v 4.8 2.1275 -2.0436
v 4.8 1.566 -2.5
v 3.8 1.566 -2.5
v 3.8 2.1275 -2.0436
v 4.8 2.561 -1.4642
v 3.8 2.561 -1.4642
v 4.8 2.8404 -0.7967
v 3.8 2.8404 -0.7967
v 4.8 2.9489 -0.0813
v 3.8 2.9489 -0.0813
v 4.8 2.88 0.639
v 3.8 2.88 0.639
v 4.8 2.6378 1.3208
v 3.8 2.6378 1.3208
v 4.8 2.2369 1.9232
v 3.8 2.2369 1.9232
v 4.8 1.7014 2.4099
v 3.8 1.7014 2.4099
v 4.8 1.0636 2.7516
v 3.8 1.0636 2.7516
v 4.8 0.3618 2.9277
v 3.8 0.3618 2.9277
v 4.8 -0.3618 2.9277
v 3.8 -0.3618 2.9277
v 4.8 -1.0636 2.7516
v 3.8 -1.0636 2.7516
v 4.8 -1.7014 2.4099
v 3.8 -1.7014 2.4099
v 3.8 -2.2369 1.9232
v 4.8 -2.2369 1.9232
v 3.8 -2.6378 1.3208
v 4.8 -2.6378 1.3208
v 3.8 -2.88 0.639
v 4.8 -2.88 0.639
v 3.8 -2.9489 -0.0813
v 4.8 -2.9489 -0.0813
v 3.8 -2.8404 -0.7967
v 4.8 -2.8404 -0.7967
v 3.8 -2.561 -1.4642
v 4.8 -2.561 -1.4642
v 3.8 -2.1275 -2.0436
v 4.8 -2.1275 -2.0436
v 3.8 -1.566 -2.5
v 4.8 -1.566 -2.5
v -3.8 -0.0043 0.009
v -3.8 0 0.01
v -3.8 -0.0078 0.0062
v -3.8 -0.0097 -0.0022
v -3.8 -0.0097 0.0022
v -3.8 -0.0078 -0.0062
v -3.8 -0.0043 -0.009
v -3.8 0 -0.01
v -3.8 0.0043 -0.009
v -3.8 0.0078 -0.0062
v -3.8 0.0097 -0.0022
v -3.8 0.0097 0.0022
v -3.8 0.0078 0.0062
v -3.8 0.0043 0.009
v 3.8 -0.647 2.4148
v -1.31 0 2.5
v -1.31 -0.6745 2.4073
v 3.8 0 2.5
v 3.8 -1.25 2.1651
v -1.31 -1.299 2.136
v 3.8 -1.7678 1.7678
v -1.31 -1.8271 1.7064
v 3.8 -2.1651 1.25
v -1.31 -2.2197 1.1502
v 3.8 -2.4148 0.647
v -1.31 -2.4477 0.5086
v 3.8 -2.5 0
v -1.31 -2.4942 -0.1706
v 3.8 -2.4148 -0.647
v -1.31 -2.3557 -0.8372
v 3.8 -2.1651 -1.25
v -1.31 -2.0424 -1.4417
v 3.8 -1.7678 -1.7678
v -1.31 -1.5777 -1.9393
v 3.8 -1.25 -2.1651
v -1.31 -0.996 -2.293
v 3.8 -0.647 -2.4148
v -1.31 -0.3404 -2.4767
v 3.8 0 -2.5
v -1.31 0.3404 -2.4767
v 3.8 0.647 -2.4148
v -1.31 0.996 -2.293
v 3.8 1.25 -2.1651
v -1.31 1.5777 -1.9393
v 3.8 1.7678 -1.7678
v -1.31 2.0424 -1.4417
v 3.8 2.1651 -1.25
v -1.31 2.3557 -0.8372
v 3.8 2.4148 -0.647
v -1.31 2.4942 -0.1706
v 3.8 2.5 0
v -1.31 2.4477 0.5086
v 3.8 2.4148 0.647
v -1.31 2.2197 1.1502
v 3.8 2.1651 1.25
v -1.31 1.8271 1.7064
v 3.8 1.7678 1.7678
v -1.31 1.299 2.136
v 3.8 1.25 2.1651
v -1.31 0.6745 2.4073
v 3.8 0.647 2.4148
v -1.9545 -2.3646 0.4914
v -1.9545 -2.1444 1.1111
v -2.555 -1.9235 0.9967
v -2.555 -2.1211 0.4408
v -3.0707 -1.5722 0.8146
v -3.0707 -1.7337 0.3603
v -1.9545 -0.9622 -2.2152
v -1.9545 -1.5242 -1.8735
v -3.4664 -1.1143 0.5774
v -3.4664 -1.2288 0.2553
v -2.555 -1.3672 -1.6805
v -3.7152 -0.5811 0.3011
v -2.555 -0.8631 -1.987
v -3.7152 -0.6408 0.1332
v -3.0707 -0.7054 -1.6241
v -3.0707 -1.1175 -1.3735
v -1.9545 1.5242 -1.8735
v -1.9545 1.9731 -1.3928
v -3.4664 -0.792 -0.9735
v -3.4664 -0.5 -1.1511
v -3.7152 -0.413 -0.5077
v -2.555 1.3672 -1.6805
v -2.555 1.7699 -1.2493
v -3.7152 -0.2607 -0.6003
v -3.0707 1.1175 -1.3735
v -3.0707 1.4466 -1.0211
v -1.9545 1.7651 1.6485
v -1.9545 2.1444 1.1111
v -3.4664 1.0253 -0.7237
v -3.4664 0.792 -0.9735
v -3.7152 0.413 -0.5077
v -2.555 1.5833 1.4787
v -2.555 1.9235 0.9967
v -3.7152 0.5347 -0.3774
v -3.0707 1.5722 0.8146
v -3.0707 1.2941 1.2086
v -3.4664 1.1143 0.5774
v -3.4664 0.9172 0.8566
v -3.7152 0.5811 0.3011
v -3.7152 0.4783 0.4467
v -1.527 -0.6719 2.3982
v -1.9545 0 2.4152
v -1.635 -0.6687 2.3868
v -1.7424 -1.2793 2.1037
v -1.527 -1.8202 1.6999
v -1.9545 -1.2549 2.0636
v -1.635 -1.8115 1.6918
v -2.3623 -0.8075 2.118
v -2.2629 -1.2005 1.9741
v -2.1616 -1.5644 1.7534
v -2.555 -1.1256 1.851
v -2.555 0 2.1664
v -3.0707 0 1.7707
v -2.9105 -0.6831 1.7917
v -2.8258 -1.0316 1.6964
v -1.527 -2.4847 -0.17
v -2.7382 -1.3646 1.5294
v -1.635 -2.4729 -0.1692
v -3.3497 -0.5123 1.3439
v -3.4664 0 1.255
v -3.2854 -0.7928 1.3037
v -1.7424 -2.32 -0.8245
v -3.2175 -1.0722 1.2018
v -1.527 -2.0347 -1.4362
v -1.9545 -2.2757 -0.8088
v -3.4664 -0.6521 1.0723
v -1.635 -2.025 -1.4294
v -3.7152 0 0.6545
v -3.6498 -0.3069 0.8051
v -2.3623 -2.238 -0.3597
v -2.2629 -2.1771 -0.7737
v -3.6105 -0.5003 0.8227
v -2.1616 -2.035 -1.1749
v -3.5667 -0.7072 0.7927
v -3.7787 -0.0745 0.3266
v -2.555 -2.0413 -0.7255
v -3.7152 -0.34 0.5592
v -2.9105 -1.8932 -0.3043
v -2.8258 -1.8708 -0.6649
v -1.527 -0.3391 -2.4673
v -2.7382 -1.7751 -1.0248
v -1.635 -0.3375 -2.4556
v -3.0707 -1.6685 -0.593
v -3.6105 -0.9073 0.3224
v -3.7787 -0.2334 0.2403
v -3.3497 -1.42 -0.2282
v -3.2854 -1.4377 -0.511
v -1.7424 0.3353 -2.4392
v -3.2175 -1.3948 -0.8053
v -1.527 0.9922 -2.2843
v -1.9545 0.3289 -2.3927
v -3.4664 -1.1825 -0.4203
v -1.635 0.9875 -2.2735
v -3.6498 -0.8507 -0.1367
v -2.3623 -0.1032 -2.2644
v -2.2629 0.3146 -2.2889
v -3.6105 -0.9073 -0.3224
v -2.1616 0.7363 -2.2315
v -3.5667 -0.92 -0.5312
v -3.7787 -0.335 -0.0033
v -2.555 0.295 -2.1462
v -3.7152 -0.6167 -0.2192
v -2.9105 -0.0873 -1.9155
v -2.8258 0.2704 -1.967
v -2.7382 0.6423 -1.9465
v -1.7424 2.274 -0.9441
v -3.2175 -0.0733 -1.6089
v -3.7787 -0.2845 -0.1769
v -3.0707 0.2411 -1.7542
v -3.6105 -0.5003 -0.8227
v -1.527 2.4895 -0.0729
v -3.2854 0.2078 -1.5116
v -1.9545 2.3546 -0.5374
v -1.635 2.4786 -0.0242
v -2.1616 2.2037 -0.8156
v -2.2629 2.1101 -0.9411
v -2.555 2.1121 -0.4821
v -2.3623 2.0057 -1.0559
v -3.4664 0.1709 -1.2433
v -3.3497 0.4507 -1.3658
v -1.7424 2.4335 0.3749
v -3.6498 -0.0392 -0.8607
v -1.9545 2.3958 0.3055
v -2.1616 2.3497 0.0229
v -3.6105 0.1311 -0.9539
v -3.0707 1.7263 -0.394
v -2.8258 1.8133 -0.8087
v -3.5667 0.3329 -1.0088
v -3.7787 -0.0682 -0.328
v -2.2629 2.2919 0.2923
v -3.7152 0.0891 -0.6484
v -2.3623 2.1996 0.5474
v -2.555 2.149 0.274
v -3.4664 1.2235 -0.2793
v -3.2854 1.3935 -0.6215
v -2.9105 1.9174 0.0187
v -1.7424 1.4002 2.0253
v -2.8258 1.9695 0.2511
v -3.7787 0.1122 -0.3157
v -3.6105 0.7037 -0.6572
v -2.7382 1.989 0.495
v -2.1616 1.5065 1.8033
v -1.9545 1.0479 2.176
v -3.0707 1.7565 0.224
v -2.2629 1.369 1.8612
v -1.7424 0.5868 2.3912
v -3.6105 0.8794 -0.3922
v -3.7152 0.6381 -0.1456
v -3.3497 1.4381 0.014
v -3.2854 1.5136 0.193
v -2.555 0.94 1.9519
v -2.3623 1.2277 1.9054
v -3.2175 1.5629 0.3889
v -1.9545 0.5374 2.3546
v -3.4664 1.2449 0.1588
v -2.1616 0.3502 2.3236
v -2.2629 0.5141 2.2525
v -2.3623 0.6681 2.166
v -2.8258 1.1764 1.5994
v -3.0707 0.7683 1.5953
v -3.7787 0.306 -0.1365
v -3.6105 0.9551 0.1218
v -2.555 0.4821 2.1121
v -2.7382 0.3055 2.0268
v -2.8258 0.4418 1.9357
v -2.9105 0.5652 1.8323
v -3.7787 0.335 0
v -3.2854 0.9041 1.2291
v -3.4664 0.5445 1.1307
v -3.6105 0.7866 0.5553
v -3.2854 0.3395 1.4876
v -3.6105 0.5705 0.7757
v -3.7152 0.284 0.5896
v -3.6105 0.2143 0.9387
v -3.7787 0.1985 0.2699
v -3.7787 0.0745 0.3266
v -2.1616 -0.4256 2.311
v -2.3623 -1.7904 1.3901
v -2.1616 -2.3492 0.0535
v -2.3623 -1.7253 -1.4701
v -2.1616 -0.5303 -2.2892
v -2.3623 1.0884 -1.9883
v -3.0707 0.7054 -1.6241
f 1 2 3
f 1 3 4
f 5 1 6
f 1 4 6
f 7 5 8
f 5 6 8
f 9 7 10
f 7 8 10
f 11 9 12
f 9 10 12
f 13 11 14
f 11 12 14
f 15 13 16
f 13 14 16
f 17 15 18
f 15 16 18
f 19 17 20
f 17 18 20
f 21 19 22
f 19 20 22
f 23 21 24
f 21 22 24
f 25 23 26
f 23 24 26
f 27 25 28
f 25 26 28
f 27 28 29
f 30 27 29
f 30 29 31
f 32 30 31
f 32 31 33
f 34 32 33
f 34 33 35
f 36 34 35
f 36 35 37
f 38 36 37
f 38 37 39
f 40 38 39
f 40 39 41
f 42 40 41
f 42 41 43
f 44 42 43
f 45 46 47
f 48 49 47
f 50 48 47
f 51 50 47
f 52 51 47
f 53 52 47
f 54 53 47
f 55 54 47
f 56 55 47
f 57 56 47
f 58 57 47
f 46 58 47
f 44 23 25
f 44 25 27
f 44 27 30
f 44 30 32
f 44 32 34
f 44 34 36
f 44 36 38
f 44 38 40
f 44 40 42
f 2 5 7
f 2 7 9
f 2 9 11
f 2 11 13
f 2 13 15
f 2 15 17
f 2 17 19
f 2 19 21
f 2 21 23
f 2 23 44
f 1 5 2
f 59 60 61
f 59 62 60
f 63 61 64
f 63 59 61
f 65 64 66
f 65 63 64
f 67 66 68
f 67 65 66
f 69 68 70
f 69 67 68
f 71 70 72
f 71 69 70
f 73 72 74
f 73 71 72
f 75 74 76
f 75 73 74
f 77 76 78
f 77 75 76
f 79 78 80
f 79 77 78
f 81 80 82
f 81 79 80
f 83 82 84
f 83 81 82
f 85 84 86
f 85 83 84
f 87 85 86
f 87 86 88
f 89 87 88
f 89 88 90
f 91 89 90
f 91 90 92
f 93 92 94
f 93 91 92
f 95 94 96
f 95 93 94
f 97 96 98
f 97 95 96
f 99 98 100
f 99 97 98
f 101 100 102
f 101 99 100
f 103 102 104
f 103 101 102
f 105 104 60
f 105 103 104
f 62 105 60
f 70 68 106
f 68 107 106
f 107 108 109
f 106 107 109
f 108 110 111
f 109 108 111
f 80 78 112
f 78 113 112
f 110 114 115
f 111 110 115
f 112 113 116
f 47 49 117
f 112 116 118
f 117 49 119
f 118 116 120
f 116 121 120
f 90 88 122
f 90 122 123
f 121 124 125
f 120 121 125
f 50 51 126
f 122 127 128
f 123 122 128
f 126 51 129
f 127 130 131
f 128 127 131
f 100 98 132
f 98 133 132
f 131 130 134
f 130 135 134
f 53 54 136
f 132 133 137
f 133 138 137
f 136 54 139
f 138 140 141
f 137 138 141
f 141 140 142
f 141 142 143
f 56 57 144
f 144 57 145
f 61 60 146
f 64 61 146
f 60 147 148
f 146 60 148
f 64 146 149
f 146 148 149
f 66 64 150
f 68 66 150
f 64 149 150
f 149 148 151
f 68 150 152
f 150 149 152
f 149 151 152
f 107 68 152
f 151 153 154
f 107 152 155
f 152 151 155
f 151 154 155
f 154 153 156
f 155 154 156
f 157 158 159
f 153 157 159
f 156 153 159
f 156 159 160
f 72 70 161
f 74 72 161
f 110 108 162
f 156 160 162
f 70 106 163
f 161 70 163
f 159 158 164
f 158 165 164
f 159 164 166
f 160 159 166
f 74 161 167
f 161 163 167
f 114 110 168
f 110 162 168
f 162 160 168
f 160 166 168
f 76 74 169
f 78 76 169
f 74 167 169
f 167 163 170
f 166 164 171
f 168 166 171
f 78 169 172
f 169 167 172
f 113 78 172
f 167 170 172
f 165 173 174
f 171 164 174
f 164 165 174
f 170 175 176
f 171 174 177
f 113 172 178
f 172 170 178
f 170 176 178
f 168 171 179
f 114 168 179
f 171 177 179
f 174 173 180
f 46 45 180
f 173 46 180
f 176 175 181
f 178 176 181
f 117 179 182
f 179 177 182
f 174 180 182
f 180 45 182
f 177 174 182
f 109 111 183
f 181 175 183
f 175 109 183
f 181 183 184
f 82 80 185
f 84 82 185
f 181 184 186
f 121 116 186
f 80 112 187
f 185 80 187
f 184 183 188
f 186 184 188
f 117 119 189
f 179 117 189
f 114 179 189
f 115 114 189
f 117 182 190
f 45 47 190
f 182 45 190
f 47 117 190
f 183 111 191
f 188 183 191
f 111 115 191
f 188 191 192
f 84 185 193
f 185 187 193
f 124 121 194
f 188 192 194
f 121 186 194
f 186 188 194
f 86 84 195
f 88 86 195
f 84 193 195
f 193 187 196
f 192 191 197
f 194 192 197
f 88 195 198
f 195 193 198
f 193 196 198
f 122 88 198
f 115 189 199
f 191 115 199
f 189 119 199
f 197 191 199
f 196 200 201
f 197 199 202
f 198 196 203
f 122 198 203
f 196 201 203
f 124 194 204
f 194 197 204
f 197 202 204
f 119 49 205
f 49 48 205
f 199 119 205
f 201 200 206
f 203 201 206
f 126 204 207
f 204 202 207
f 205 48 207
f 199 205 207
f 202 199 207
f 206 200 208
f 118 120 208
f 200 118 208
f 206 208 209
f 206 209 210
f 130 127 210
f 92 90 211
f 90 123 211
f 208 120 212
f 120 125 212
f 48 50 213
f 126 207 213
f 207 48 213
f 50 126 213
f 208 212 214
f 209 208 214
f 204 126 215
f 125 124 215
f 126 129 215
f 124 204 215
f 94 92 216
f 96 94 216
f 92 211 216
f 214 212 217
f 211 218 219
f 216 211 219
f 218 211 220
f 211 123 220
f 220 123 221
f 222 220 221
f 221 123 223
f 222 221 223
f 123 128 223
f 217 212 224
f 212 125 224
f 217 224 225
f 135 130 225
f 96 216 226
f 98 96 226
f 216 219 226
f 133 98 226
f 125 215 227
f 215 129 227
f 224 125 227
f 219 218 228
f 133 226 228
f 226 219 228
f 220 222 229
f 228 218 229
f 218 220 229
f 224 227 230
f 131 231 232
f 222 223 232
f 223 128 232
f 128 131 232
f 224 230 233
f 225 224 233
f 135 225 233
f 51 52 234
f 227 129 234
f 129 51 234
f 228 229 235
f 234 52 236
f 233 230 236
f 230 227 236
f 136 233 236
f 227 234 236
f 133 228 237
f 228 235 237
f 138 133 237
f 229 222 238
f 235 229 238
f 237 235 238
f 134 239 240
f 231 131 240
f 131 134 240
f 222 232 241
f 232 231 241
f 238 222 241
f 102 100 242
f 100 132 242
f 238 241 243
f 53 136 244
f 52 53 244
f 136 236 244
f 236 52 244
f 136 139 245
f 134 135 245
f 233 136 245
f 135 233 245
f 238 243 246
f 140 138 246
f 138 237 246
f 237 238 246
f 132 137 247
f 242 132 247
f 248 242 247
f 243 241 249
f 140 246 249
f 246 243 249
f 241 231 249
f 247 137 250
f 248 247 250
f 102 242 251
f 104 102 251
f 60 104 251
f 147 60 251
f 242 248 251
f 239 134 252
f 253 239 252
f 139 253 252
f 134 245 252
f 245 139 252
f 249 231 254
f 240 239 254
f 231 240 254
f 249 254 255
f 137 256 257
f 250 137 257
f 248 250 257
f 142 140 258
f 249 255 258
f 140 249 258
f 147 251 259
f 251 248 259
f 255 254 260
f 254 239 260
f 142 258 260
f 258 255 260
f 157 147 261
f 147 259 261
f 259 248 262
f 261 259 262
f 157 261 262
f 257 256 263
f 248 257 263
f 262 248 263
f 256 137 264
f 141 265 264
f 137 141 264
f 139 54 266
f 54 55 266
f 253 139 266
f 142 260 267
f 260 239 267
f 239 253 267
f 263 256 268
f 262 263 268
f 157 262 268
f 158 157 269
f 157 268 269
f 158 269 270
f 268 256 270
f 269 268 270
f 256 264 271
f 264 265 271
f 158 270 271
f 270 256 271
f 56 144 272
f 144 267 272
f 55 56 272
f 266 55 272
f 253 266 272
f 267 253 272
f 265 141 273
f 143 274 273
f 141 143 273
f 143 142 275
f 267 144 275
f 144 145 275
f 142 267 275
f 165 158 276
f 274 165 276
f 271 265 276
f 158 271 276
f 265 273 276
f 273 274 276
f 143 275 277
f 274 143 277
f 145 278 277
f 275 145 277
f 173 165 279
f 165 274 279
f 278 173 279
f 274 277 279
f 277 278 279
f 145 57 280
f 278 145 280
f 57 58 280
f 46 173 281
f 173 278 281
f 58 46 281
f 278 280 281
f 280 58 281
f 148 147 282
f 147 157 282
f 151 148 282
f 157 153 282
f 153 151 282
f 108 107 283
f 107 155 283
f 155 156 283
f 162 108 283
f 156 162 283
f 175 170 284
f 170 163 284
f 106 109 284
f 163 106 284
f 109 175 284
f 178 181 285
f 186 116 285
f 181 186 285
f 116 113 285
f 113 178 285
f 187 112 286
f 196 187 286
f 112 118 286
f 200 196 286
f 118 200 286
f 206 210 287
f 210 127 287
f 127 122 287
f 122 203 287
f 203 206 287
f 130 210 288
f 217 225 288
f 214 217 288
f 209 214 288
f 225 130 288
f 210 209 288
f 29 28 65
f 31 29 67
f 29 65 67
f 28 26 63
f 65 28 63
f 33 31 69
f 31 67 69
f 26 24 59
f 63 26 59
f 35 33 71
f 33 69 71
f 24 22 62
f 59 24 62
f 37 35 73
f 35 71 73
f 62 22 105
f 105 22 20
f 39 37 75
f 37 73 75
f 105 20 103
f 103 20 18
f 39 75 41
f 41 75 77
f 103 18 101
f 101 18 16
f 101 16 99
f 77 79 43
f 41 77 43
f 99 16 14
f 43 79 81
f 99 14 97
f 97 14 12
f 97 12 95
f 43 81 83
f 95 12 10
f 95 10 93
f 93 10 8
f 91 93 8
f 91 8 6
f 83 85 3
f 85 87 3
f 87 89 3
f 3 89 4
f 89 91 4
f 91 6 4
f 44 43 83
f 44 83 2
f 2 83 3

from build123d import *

# Parameters (mm, degrees)
SKETCH2_R           = 2.5
BOSS_EXTRUDE1_DEPTH = 3.8
SKETCH3_R           = 2.95
BOSS_EXTRUDE3_DEPTH = 1
SKETCH4_W           = 0.865778577
SKETCH4_H           = 6.939291368
CUT_EXTRUDE1_DEPTH  = 1


with BuildPart() as part:
    # Sketch2 → Boss-Extrude1 (new, symmetric)
    with BuildSketch(Plane(origin=(0, 0, 0), x_dir=(0, 0, -1), z_dir=(1, 0, 0))):
        with Locations(Location((0, 0, 0), (0, 0, 180))):
            Circle(SKETCH2_R)
    extrude(amount=BOSS_EXTRUDE1_DEPTH, both=True)

    # Sketch3 → Boss-Extrude3 (add)
    with BuildSketch(Plane(origin=(3.8, 0, 0), x_dir=(0, 0, -1), z_dir=(1, 0, 0))):
        Circle(SKETCH3_R)
    extrude(amount=BOSS_EXTRUDE3_DEPTH)

    # Sketch4 → Cut-Extrude1 (cut)
    with BuildSketch(Plane.ZY.offset(-3.8)):
        with Locations((-2.932889289, -0.568577956)):
            Rectangle(SKETCH4_W, SKETCH4_H)
    extrude(amount=-CUT_EXTRUDE1_DEPTH, mode=Mode.SUBTRACT)

    # Sketch5 → Cut-Revolve4 (revolve, cut)
    with BuildSketch(Plane(origin=(0, 0, 0), x_dir=(1, 0, 0), z_dir=(0, 1, 0))):
        with BuildLine():
            Line((-3.8, -0.01), (-3.8, -2.5))
            Line((-3.8, -2.5), (-1.31, -2.5))
            ThreePointArc((-1.31, -2.5), (-3.070695885, -1.770695885), (-3.8, -0.01))
        make_face()
    revolve(axis=Axis((-4.317331634, 0, 0), (1, 0, 0)), mode=Mode.SUBTRACT)


solid = part.part
